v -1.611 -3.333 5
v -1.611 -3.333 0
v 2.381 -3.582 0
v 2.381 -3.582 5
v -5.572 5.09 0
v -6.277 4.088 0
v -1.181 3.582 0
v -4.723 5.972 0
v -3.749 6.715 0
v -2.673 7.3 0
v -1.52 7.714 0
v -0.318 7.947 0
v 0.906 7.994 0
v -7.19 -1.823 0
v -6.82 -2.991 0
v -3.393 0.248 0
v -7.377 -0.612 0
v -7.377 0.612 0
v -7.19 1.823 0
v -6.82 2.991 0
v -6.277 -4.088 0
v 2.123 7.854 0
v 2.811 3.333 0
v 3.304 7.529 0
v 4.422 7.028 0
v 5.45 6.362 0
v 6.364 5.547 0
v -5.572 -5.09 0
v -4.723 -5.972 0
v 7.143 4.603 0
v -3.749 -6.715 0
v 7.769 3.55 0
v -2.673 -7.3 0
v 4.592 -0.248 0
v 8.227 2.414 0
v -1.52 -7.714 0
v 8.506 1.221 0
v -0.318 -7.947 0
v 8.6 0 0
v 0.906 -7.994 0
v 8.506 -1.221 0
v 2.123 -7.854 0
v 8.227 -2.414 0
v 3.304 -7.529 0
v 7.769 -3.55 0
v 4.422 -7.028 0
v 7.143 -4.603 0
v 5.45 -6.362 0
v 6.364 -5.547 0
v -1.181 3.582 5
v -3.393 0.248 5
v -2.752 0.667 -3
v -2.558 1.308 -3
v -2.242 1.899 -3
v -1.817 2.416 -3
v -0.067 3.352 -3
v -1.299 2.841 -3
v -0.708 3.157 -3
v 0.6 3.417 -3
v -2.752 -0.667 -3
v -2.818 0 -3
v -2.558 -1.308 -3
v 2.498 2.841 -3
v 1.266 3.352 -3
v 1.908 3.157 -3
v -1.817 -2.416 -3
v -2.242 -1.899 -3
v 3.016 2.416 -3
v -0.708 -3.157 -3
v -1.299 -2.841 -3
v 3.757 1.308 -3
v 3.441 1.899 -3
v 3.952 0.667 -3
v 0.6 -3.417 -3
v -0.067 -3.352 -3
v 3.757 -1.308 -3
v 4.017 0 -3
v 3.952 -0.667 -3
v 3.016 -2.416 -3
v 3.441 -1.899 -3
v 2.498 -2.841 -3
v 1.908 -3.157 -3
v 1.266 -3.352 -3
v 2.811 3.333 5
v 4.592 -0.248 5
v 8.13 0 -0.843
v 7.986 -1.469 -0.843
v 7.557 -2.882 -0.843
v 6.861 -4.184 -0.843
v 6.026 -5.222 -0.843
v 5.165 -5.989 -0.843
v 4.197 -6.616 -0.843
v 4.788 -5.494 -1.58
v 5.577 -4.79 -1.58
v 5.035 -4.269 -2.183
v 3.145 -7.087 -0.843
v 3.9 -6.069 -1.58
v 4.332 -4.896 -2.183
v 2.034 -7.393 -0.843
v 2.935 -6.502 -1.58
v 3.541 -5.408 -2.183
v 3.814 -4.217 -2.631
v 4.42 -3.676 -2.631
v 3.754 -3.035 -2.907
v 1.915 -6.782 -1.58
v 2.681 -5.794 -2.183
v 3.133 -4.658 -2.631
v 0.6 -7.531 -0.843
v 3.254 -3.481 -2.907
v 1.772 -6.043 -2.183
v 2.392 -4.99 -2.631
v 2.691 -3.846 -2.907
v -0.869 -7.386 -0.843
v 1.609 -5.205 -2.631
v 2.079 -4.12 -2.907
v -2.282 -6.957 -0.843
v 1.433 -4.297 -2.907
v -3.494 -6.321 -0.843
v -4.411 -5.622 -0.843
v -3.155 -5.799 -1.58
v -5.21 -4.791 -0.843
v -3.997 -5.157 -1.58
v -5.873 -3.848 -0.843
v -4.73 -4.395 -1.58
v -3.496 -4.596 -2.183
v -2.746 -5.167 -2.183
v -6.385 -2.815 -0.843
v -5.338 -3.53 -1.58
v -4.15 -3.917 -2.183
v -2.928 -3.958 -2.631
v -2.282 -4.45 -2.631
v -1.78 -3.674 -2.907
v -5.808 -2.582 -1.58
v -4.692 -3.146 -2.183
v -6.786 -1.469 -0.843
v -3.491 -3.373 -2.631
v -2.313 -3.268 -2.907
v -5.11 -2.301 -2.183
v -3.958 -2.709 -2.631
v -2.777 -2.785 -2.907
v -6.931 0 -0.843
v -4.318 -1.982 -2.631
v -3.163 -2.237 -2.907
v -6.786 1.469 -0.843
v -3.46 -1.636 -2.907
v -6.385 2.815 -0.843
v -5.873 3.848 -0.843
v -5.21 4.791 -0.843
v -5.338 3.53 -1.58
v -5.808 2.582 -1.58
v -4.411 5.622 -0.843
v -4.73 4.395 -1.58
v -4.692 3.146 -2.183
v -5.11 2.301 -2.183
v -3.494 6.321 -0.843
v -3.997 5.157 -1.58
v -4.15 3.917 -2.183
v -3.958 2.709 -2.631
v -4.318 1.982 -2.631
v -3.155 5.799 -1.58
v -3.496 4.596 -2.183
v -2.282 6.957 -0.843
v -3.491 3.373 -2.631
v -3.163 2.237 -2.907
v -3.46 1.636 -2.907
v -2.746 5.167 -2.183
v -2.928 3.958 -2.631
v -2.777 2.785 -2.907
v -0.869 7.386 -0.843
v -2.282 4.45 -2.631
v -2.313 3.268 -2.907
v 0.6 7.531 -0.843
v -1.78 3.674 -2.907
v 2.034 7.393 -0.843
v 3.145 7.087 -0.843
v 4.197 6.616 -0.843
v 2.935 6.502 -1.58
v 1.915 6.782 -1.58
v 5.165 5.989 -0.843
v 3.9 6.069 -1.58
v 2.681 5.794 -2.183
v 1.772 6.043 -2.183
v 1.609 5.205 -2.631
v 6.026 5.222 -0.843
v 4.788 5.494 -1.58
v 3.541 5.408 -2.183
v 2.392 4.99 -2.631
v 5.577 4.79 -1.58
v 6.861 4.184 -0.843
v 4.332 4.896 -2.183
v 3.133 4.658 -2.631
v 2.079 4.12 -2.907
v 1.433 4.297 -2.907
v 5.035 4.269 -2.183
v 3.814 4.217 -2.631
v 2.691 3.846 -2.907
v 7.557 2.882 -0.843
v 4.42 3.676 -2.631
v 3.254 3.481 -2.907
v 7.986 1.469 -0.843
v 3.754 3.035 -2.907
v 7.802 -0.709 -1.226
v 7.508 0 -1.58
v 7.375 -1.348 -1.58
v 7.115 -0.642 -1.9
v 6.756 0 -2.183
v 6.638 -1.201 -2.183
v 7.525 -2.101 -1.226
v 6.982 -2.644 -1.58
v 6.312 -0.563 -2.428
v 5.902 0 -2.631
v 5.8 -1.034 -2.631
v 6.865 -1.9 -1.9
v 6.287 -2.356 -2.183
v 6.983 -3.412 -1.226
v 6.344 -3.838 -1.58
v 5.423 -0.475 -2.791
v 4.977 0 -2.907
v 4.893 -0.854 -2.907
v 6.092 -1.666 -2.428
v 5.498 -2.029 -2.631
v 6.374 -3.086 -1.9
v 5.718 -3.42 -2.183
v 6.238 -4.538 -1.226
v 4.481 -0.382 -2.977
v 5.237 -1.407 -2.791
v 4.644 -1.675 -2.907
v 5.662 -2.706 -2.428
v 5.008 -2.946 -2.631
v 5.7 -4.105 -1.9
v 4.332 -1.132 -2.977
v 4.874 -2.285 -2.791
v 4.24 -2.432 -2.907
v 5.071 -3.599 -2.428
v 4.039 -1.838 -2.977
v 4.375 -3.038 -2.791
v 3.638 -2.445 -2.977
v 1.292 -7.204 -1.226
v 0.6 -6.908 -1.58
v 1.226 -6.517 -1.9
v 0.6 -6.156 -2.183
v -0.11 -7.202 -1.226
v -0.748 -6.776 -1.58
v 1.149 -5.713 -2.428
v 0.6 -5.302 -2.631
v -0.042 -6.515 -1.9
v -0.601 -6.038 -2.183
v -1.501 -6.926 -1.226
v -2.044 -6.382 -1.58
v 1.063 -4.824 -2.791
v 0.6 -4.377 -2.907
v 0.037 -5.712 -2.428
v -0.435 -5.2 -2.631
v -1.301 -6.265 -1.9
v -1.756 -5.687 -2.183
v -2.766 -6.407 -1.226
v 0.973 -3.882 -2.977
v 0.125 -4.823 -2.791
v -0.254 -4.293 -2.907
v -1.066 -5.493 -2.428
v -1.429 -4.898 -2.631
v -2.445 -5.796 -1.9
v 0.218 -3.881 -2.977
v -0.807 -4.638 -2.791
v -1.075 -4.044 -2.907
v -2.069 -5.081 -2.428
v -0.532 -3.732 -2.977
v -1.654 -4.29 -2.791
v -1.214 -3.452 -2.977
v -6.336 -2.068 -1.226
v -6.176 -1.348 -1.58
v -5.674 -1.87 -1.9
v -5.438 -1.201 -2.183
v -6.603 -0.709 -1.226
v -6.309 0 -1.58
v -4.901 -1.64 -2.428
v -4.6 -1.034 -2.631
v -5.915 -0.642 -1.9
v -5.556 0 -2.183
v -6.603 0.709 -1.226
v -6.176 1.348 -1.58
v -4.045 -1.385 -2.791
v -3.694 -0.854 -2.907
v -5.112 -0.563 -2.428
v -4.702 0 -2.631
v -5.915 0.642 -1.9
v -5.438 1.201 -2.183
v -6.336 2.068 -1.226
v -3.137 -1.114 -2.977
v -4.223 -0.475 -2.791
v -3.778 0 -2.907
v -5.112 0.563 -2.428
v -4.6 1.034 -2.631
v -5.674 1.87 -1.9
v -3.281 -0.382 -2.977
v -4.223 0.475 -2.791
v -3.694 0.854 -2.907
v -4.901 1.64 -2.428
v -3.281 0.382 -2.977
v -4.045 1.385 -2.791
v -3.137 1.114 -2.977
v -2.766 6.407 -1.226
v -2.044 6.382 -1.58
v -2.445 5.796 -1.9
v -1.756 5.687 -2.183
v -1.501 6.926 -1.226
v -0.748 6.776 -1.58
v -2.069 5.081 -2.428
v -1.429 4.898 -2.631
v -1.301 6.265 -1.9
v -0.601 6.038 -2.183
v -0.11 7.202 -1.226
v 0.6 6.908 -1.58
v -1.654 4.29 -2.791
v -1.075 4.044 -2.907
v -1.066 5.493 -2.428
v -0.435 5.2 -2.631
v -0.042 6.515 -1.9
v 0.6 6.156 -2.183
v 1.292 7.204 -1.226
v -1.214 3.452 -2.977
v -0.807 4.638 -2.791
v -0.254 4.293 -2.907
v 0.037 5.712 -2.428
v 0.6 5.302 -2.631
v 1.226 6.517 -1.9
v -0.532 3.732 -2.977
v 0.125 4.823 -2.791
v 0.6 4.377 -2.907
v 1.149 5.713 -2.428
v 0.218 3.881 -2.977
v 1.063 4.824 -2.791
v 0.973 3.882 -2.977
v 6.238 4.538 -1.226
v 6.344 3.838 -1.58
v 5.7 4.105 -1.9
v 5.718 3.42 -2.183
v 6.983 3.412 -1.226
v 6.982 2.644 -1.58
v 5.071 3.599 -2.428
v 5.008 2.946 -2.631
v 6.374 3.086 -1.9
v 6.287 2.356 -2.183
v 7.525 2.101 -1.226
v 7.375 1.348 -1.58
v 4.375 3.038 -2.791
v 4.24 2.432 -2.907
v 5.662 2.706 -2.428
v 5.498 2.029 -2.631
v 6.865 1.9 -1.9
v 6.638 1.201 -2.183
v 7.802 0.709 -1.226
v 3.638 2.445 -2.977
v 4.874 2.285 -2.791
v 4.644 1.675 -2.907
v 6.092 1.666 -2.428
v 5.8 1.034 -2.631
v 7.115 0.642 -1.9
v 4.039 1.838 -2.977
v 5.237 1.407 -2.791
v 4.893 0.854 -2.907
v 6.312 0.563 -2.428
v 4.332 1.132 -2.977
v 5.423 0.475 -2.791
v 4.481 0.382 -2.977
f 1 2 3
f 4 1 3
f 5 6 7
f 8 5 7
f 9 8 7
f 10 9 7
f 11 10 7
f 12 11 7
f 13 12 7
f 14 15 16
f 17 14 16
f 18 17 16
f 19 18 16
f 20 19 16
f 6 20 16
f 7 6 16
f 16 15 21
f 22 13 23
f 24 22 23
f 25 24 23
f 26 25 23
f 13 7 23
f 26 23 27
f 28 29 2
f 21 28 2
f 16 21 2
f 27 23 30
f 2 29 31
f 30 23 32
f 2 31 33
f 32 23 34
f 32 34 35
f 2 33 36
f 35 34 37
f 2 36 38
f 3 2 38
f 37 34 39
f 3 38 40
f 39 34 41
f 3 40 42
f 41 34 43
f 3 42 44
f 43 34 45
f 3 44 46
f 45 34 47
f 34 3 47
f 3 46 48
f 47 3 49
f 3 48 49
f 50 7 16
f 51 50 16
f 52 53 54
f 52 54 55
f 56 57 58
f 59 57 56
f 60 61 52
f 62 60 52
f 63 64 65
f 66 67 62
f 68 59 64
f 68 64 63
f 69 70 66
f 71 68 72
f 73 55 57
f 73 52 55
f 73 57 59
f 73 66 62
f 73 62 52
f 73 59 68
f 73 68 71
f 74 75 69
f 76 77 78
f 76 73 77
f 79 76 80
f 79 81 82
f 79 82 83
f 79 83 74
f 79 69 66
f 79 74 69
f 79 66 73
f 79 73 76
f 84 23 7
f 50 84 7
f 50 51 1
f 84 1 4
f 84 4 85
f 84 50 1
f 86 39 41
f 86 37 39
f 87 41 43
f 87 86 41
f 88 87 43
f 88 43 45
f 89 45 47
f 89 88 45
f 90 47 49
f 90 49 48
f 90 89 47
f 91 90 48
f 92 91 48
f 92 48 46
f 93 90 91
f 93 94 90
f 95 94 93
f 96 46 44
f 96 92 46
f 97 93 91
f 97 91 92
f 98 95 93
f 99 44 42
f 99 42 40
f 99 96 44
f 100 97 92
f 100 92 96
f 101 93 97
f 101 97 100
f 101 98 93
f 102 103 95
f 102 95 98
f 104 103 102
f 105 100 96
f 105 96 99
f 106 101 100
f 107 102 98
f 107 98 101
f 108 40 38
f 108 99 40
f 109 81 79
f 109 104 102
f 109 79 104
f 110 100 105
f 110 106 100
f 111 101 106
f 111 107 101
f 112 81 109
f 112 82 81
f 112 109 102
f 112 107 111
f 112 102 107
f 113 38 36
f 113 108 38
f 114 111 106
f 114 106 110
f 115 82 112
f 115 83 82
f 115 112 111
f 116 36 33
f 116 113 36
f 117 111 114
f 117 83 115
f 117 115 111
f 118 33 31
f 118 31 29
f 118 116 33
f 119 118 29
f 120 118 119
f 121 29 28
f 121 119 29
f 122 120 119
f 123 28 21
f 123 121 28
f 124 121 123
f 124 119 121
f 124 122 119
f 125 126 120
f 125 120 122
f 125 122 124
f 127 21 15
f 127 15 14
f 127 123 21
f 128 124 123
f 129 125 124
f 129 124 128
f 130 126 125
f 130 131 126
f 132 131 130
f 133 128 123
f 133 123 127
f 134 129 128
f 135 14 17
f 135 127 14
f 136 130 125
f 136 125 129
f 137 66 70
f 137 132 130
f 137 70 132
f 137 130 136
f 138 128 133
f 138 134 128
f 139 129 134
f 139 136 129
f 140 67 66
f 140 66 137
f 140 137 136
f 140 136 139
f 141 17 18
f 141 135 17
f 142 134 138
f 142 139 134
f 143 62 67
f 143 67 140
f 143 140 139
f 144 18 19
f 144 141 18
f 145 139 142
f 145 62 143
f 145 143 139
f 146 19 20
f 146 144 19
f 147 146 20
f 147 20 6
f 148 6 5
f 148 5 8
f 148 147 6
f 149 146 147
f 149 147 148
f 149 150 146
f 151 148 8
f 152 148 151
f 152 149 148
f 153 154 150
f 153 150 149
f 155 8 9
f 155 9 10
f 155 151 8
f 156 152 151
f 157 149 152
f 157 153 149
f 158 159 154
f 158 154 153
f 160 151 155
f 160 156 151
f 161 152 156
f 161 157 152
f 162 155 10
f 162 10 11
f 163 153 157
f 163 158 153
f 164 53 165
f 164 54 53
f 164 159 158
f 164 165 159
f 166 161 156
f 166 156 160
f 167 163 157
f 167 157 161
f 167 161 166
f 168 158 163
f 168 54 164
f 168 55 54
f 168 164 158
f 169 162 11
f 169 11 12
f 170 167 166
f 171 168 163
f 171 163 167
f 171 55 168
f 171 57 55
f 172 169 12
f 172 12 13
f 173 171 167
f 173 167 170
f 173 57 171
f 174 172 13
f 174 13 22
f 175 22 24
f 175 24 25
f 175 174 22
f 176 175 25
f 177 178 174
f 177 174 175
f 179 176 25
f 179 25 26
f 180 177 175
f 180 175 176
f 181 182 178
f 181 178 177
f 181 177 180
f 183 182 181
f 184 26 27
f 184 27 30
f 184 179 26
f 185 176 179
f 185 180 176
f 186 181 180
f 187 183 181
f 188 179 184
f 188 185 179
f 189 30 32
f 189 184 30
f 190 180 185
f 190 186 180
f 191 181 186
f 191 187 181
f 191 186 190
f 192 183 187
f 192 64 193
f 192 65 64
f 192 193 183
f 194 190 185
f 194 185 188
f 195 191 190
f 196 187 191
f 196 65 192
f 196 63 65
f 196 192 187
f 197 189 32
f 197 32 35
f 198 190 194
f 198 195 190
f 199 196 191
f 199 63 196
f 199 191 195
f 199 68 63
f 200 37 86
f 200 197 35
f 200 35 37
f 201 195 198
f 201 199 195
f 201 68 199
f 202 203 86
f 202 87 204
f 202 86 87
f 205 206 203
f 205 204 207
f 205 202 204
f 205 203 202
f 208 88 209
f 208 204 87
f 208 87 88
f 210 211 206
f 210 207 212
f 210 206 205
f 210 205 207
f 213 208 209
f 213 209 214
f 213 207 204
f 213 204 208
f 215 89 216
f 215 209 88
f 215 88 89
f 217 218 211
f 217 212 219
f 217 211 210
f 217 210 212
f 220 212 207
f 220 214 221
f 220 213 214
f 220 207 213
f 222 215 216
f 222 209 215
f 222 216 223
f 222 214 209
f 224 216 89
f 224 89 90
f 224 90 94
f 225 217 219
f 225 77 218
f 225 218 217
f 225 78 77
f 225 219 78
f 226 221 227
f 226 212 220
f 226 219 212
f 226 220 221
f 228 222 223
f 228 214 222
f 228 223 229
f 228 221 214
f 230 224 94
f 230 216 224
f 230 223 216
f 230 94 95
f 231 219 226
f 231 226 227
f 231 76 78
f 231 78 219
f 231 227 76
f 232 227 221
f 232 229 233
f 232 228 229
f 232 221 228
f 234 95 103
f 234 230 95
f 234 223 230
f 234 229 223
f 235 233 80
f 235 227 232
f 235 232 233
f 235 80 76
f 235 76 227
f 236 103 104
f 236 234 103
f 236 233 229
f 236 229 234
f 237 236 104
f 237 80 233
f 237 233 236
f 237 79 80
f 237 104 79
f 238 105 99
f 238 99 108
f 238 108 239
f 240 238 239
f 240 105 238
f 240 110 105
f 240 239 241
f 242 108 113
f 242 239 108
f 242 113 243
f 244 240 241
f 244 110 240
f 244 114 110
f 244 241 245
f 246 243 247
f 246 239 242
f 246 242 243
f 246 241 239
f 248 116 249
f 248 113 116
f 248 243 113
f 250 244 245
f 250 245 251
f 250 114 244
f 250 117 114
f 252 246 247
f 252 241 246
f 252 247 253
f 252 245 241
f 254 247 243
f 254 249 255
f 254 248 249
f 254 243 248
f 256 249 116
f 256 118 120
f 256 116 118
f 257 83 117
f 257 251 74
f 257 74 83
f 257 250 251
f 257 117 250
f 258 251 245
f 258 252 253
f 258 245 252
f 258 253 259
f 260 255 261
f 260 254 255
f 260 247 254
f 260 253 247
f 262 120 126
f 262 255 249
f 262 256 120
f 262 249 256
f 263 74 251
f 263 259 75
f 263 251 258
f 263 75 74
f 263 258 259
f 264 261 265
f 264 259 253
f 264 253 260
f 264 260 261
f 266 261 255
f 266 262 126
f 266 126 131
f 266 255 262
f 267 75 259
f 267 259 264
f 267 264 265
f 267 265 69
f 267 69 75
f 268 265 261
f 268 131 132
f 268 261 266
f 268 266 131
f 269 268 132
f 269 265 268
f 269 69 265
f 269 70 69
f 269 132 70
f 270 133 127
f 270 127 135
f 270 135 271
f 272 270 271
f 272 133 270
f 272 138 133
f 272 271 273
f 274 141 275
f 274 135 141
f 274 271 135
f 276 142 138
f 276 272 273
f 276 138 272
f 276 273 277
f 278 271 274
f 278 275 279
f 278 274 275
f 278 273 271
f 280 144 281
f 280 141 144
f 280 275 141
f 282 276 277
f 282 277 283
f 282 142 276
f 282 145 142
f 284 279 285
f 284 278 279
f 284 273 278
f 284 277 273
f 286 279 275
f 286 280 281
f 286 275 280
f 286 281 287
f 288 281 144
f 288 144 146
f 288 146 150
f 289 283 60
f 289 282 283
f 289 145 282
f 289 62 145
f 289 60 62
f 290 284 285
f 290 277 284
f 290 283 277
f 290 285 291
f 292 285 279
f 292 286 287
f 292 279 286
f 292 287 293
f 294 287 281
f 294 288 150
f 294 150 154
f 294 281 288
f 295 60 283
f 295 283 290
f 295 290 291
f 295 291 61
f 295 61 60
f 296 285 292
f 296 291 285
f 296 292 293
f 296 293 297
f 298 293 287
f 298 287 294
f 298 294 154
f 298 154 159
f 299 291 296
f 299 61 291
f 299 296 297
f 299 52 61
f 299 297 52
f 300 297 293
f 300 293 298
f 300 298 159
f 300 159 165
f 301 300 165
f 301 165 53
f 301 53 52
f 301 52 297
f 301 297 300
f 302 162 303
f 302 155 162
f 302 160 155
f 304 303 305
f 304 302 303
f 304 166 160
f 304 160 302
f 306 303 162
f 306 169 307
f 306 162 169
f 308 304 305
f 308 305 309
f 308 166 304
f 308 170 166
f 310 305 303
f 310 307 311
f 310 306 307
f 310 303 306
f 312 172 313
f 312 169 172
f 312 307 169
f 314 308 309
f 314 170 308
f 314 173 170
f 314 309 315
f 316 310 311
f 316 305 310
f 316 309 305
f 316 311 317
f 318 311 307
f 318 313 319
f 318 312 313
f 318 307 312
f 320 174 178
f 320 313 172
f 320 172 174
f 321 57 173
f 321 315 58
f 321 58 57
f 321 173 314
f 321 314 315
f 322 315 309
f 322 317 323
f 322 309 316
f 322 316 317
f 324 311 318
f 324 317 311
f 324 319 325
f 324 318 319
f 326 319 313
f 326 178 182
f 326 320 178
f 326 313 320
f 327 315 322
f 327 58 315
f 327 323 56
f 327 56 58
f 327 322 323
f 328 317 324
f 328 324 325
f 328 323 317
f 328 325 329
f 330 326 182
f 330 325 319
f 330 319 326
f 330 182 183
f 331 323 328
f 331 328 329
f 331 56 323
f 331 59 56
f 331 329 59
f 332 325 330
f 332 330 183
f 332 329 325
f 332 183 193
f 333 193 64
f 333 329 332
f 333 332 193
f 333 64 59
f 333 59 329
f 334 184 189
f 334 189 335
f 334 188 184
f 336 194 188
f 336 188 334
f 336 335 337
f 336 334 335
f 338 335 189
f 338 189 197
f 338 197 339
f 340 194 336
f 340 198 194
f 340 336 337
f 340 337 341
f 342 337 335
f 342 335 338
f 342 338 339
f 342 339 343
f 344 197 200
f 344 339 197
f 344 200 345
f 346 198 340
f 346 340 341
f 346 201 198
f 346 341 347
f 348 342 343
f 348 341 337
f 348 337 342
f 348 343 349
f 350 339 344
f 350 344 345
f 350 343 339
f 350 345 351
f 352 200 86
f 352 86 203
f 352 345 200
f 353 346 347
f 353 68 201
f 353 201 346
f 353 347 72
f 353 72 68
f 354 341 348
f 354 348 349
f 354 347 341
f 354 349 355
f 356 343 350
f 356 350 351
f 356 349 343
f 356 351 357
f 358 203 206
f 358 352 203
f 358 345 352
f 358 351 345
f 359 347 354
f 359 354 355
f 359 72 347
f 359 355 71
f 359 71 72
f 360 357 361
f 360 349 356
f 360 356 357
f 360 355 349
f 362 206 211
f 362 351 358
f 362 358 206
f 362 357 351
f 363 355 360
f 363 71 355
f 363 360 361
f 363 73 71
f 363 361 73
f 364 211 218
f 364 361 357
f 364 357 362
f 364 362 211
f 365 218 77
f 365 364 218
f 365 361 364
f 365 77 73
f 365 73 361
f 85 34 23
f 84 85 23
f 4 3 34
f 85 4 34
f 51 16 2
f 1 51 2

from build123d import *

# Parameters (mm, degrees)
F1_DEPTH = 5
F2_R     = 8
F3_DEPTH = 3


# Not quite as in the source:
# - a fillet or chamfer that OpenCascade refuses, or shapes differently, is made with other operations: its cross-section is extruded or revolved along the edge and cut away or added


with BuildPart() as f1:
    # F0 (on Top) → F1 (new body)
    with BuildSketch(Plane.XY):
        Polygon((4.5920703038, -0.2481590048), (2.8108349475, 3.333349142), (-1.1814597696, 3.5815081468), (-3.3925191305, 0.2481590048), (-1.6112837742, -3.333349142), (2.3810109429, -3.5815081468), align=None)
    extrude(amount=F1_DEPTH)

    # F2 (on face) → F3 (join)
    with BuildSketch(Plane(origin=(0, 0, 0), x_dir=(1, 0, 0), z_dir=(0, 0, -1))):
        with Locations((0.5997755867, 0)):
            Circle(F2_R)
        Polygon((2.8108349475, -3.333349142), (-1.1814597696, -3.5815081468), (-3.3925191305, -0.2481590048), (-1.6112837742, 3.333349142), (2.3810109429, 3.5815081468), (4.5920703038, 0.2481590048), align=None, mode=Mode.SUBTRACT)
        Polygon((-3.3925191305, -0.2481590048), (-1.1814597696, -3.5815081468), (2.8108349475, -3.333349142), (4.5920703038, 0.2481590048), (2.3810109429, 3.5815081468), (-1.6112837742, 3.333349142), align=None)
    extrude(amount=F3_DEPTH)

    # F4: fillet of radius 5 on 1 edges, made by hand

    # F4_s1 → F4_t2 (revolve, cut)
    with BuildSketch(Plane.XZ):
        with BuildLine():
            ThreePointArc((8.5997755867, 0), (6.7558126792, -2.1833001327), (4.0171998917, -3))
            Line((4.0171998917, -3), (8.5997755867, -3))
            Line((8.5997755867, -3), (8.5997755867, 0))
        make_face()
    revolve(axis=Axis((0.5997755867, 0, -3), (0, 0, -1)), mode=Mode.SUBTRACT)


solid = f1.part
